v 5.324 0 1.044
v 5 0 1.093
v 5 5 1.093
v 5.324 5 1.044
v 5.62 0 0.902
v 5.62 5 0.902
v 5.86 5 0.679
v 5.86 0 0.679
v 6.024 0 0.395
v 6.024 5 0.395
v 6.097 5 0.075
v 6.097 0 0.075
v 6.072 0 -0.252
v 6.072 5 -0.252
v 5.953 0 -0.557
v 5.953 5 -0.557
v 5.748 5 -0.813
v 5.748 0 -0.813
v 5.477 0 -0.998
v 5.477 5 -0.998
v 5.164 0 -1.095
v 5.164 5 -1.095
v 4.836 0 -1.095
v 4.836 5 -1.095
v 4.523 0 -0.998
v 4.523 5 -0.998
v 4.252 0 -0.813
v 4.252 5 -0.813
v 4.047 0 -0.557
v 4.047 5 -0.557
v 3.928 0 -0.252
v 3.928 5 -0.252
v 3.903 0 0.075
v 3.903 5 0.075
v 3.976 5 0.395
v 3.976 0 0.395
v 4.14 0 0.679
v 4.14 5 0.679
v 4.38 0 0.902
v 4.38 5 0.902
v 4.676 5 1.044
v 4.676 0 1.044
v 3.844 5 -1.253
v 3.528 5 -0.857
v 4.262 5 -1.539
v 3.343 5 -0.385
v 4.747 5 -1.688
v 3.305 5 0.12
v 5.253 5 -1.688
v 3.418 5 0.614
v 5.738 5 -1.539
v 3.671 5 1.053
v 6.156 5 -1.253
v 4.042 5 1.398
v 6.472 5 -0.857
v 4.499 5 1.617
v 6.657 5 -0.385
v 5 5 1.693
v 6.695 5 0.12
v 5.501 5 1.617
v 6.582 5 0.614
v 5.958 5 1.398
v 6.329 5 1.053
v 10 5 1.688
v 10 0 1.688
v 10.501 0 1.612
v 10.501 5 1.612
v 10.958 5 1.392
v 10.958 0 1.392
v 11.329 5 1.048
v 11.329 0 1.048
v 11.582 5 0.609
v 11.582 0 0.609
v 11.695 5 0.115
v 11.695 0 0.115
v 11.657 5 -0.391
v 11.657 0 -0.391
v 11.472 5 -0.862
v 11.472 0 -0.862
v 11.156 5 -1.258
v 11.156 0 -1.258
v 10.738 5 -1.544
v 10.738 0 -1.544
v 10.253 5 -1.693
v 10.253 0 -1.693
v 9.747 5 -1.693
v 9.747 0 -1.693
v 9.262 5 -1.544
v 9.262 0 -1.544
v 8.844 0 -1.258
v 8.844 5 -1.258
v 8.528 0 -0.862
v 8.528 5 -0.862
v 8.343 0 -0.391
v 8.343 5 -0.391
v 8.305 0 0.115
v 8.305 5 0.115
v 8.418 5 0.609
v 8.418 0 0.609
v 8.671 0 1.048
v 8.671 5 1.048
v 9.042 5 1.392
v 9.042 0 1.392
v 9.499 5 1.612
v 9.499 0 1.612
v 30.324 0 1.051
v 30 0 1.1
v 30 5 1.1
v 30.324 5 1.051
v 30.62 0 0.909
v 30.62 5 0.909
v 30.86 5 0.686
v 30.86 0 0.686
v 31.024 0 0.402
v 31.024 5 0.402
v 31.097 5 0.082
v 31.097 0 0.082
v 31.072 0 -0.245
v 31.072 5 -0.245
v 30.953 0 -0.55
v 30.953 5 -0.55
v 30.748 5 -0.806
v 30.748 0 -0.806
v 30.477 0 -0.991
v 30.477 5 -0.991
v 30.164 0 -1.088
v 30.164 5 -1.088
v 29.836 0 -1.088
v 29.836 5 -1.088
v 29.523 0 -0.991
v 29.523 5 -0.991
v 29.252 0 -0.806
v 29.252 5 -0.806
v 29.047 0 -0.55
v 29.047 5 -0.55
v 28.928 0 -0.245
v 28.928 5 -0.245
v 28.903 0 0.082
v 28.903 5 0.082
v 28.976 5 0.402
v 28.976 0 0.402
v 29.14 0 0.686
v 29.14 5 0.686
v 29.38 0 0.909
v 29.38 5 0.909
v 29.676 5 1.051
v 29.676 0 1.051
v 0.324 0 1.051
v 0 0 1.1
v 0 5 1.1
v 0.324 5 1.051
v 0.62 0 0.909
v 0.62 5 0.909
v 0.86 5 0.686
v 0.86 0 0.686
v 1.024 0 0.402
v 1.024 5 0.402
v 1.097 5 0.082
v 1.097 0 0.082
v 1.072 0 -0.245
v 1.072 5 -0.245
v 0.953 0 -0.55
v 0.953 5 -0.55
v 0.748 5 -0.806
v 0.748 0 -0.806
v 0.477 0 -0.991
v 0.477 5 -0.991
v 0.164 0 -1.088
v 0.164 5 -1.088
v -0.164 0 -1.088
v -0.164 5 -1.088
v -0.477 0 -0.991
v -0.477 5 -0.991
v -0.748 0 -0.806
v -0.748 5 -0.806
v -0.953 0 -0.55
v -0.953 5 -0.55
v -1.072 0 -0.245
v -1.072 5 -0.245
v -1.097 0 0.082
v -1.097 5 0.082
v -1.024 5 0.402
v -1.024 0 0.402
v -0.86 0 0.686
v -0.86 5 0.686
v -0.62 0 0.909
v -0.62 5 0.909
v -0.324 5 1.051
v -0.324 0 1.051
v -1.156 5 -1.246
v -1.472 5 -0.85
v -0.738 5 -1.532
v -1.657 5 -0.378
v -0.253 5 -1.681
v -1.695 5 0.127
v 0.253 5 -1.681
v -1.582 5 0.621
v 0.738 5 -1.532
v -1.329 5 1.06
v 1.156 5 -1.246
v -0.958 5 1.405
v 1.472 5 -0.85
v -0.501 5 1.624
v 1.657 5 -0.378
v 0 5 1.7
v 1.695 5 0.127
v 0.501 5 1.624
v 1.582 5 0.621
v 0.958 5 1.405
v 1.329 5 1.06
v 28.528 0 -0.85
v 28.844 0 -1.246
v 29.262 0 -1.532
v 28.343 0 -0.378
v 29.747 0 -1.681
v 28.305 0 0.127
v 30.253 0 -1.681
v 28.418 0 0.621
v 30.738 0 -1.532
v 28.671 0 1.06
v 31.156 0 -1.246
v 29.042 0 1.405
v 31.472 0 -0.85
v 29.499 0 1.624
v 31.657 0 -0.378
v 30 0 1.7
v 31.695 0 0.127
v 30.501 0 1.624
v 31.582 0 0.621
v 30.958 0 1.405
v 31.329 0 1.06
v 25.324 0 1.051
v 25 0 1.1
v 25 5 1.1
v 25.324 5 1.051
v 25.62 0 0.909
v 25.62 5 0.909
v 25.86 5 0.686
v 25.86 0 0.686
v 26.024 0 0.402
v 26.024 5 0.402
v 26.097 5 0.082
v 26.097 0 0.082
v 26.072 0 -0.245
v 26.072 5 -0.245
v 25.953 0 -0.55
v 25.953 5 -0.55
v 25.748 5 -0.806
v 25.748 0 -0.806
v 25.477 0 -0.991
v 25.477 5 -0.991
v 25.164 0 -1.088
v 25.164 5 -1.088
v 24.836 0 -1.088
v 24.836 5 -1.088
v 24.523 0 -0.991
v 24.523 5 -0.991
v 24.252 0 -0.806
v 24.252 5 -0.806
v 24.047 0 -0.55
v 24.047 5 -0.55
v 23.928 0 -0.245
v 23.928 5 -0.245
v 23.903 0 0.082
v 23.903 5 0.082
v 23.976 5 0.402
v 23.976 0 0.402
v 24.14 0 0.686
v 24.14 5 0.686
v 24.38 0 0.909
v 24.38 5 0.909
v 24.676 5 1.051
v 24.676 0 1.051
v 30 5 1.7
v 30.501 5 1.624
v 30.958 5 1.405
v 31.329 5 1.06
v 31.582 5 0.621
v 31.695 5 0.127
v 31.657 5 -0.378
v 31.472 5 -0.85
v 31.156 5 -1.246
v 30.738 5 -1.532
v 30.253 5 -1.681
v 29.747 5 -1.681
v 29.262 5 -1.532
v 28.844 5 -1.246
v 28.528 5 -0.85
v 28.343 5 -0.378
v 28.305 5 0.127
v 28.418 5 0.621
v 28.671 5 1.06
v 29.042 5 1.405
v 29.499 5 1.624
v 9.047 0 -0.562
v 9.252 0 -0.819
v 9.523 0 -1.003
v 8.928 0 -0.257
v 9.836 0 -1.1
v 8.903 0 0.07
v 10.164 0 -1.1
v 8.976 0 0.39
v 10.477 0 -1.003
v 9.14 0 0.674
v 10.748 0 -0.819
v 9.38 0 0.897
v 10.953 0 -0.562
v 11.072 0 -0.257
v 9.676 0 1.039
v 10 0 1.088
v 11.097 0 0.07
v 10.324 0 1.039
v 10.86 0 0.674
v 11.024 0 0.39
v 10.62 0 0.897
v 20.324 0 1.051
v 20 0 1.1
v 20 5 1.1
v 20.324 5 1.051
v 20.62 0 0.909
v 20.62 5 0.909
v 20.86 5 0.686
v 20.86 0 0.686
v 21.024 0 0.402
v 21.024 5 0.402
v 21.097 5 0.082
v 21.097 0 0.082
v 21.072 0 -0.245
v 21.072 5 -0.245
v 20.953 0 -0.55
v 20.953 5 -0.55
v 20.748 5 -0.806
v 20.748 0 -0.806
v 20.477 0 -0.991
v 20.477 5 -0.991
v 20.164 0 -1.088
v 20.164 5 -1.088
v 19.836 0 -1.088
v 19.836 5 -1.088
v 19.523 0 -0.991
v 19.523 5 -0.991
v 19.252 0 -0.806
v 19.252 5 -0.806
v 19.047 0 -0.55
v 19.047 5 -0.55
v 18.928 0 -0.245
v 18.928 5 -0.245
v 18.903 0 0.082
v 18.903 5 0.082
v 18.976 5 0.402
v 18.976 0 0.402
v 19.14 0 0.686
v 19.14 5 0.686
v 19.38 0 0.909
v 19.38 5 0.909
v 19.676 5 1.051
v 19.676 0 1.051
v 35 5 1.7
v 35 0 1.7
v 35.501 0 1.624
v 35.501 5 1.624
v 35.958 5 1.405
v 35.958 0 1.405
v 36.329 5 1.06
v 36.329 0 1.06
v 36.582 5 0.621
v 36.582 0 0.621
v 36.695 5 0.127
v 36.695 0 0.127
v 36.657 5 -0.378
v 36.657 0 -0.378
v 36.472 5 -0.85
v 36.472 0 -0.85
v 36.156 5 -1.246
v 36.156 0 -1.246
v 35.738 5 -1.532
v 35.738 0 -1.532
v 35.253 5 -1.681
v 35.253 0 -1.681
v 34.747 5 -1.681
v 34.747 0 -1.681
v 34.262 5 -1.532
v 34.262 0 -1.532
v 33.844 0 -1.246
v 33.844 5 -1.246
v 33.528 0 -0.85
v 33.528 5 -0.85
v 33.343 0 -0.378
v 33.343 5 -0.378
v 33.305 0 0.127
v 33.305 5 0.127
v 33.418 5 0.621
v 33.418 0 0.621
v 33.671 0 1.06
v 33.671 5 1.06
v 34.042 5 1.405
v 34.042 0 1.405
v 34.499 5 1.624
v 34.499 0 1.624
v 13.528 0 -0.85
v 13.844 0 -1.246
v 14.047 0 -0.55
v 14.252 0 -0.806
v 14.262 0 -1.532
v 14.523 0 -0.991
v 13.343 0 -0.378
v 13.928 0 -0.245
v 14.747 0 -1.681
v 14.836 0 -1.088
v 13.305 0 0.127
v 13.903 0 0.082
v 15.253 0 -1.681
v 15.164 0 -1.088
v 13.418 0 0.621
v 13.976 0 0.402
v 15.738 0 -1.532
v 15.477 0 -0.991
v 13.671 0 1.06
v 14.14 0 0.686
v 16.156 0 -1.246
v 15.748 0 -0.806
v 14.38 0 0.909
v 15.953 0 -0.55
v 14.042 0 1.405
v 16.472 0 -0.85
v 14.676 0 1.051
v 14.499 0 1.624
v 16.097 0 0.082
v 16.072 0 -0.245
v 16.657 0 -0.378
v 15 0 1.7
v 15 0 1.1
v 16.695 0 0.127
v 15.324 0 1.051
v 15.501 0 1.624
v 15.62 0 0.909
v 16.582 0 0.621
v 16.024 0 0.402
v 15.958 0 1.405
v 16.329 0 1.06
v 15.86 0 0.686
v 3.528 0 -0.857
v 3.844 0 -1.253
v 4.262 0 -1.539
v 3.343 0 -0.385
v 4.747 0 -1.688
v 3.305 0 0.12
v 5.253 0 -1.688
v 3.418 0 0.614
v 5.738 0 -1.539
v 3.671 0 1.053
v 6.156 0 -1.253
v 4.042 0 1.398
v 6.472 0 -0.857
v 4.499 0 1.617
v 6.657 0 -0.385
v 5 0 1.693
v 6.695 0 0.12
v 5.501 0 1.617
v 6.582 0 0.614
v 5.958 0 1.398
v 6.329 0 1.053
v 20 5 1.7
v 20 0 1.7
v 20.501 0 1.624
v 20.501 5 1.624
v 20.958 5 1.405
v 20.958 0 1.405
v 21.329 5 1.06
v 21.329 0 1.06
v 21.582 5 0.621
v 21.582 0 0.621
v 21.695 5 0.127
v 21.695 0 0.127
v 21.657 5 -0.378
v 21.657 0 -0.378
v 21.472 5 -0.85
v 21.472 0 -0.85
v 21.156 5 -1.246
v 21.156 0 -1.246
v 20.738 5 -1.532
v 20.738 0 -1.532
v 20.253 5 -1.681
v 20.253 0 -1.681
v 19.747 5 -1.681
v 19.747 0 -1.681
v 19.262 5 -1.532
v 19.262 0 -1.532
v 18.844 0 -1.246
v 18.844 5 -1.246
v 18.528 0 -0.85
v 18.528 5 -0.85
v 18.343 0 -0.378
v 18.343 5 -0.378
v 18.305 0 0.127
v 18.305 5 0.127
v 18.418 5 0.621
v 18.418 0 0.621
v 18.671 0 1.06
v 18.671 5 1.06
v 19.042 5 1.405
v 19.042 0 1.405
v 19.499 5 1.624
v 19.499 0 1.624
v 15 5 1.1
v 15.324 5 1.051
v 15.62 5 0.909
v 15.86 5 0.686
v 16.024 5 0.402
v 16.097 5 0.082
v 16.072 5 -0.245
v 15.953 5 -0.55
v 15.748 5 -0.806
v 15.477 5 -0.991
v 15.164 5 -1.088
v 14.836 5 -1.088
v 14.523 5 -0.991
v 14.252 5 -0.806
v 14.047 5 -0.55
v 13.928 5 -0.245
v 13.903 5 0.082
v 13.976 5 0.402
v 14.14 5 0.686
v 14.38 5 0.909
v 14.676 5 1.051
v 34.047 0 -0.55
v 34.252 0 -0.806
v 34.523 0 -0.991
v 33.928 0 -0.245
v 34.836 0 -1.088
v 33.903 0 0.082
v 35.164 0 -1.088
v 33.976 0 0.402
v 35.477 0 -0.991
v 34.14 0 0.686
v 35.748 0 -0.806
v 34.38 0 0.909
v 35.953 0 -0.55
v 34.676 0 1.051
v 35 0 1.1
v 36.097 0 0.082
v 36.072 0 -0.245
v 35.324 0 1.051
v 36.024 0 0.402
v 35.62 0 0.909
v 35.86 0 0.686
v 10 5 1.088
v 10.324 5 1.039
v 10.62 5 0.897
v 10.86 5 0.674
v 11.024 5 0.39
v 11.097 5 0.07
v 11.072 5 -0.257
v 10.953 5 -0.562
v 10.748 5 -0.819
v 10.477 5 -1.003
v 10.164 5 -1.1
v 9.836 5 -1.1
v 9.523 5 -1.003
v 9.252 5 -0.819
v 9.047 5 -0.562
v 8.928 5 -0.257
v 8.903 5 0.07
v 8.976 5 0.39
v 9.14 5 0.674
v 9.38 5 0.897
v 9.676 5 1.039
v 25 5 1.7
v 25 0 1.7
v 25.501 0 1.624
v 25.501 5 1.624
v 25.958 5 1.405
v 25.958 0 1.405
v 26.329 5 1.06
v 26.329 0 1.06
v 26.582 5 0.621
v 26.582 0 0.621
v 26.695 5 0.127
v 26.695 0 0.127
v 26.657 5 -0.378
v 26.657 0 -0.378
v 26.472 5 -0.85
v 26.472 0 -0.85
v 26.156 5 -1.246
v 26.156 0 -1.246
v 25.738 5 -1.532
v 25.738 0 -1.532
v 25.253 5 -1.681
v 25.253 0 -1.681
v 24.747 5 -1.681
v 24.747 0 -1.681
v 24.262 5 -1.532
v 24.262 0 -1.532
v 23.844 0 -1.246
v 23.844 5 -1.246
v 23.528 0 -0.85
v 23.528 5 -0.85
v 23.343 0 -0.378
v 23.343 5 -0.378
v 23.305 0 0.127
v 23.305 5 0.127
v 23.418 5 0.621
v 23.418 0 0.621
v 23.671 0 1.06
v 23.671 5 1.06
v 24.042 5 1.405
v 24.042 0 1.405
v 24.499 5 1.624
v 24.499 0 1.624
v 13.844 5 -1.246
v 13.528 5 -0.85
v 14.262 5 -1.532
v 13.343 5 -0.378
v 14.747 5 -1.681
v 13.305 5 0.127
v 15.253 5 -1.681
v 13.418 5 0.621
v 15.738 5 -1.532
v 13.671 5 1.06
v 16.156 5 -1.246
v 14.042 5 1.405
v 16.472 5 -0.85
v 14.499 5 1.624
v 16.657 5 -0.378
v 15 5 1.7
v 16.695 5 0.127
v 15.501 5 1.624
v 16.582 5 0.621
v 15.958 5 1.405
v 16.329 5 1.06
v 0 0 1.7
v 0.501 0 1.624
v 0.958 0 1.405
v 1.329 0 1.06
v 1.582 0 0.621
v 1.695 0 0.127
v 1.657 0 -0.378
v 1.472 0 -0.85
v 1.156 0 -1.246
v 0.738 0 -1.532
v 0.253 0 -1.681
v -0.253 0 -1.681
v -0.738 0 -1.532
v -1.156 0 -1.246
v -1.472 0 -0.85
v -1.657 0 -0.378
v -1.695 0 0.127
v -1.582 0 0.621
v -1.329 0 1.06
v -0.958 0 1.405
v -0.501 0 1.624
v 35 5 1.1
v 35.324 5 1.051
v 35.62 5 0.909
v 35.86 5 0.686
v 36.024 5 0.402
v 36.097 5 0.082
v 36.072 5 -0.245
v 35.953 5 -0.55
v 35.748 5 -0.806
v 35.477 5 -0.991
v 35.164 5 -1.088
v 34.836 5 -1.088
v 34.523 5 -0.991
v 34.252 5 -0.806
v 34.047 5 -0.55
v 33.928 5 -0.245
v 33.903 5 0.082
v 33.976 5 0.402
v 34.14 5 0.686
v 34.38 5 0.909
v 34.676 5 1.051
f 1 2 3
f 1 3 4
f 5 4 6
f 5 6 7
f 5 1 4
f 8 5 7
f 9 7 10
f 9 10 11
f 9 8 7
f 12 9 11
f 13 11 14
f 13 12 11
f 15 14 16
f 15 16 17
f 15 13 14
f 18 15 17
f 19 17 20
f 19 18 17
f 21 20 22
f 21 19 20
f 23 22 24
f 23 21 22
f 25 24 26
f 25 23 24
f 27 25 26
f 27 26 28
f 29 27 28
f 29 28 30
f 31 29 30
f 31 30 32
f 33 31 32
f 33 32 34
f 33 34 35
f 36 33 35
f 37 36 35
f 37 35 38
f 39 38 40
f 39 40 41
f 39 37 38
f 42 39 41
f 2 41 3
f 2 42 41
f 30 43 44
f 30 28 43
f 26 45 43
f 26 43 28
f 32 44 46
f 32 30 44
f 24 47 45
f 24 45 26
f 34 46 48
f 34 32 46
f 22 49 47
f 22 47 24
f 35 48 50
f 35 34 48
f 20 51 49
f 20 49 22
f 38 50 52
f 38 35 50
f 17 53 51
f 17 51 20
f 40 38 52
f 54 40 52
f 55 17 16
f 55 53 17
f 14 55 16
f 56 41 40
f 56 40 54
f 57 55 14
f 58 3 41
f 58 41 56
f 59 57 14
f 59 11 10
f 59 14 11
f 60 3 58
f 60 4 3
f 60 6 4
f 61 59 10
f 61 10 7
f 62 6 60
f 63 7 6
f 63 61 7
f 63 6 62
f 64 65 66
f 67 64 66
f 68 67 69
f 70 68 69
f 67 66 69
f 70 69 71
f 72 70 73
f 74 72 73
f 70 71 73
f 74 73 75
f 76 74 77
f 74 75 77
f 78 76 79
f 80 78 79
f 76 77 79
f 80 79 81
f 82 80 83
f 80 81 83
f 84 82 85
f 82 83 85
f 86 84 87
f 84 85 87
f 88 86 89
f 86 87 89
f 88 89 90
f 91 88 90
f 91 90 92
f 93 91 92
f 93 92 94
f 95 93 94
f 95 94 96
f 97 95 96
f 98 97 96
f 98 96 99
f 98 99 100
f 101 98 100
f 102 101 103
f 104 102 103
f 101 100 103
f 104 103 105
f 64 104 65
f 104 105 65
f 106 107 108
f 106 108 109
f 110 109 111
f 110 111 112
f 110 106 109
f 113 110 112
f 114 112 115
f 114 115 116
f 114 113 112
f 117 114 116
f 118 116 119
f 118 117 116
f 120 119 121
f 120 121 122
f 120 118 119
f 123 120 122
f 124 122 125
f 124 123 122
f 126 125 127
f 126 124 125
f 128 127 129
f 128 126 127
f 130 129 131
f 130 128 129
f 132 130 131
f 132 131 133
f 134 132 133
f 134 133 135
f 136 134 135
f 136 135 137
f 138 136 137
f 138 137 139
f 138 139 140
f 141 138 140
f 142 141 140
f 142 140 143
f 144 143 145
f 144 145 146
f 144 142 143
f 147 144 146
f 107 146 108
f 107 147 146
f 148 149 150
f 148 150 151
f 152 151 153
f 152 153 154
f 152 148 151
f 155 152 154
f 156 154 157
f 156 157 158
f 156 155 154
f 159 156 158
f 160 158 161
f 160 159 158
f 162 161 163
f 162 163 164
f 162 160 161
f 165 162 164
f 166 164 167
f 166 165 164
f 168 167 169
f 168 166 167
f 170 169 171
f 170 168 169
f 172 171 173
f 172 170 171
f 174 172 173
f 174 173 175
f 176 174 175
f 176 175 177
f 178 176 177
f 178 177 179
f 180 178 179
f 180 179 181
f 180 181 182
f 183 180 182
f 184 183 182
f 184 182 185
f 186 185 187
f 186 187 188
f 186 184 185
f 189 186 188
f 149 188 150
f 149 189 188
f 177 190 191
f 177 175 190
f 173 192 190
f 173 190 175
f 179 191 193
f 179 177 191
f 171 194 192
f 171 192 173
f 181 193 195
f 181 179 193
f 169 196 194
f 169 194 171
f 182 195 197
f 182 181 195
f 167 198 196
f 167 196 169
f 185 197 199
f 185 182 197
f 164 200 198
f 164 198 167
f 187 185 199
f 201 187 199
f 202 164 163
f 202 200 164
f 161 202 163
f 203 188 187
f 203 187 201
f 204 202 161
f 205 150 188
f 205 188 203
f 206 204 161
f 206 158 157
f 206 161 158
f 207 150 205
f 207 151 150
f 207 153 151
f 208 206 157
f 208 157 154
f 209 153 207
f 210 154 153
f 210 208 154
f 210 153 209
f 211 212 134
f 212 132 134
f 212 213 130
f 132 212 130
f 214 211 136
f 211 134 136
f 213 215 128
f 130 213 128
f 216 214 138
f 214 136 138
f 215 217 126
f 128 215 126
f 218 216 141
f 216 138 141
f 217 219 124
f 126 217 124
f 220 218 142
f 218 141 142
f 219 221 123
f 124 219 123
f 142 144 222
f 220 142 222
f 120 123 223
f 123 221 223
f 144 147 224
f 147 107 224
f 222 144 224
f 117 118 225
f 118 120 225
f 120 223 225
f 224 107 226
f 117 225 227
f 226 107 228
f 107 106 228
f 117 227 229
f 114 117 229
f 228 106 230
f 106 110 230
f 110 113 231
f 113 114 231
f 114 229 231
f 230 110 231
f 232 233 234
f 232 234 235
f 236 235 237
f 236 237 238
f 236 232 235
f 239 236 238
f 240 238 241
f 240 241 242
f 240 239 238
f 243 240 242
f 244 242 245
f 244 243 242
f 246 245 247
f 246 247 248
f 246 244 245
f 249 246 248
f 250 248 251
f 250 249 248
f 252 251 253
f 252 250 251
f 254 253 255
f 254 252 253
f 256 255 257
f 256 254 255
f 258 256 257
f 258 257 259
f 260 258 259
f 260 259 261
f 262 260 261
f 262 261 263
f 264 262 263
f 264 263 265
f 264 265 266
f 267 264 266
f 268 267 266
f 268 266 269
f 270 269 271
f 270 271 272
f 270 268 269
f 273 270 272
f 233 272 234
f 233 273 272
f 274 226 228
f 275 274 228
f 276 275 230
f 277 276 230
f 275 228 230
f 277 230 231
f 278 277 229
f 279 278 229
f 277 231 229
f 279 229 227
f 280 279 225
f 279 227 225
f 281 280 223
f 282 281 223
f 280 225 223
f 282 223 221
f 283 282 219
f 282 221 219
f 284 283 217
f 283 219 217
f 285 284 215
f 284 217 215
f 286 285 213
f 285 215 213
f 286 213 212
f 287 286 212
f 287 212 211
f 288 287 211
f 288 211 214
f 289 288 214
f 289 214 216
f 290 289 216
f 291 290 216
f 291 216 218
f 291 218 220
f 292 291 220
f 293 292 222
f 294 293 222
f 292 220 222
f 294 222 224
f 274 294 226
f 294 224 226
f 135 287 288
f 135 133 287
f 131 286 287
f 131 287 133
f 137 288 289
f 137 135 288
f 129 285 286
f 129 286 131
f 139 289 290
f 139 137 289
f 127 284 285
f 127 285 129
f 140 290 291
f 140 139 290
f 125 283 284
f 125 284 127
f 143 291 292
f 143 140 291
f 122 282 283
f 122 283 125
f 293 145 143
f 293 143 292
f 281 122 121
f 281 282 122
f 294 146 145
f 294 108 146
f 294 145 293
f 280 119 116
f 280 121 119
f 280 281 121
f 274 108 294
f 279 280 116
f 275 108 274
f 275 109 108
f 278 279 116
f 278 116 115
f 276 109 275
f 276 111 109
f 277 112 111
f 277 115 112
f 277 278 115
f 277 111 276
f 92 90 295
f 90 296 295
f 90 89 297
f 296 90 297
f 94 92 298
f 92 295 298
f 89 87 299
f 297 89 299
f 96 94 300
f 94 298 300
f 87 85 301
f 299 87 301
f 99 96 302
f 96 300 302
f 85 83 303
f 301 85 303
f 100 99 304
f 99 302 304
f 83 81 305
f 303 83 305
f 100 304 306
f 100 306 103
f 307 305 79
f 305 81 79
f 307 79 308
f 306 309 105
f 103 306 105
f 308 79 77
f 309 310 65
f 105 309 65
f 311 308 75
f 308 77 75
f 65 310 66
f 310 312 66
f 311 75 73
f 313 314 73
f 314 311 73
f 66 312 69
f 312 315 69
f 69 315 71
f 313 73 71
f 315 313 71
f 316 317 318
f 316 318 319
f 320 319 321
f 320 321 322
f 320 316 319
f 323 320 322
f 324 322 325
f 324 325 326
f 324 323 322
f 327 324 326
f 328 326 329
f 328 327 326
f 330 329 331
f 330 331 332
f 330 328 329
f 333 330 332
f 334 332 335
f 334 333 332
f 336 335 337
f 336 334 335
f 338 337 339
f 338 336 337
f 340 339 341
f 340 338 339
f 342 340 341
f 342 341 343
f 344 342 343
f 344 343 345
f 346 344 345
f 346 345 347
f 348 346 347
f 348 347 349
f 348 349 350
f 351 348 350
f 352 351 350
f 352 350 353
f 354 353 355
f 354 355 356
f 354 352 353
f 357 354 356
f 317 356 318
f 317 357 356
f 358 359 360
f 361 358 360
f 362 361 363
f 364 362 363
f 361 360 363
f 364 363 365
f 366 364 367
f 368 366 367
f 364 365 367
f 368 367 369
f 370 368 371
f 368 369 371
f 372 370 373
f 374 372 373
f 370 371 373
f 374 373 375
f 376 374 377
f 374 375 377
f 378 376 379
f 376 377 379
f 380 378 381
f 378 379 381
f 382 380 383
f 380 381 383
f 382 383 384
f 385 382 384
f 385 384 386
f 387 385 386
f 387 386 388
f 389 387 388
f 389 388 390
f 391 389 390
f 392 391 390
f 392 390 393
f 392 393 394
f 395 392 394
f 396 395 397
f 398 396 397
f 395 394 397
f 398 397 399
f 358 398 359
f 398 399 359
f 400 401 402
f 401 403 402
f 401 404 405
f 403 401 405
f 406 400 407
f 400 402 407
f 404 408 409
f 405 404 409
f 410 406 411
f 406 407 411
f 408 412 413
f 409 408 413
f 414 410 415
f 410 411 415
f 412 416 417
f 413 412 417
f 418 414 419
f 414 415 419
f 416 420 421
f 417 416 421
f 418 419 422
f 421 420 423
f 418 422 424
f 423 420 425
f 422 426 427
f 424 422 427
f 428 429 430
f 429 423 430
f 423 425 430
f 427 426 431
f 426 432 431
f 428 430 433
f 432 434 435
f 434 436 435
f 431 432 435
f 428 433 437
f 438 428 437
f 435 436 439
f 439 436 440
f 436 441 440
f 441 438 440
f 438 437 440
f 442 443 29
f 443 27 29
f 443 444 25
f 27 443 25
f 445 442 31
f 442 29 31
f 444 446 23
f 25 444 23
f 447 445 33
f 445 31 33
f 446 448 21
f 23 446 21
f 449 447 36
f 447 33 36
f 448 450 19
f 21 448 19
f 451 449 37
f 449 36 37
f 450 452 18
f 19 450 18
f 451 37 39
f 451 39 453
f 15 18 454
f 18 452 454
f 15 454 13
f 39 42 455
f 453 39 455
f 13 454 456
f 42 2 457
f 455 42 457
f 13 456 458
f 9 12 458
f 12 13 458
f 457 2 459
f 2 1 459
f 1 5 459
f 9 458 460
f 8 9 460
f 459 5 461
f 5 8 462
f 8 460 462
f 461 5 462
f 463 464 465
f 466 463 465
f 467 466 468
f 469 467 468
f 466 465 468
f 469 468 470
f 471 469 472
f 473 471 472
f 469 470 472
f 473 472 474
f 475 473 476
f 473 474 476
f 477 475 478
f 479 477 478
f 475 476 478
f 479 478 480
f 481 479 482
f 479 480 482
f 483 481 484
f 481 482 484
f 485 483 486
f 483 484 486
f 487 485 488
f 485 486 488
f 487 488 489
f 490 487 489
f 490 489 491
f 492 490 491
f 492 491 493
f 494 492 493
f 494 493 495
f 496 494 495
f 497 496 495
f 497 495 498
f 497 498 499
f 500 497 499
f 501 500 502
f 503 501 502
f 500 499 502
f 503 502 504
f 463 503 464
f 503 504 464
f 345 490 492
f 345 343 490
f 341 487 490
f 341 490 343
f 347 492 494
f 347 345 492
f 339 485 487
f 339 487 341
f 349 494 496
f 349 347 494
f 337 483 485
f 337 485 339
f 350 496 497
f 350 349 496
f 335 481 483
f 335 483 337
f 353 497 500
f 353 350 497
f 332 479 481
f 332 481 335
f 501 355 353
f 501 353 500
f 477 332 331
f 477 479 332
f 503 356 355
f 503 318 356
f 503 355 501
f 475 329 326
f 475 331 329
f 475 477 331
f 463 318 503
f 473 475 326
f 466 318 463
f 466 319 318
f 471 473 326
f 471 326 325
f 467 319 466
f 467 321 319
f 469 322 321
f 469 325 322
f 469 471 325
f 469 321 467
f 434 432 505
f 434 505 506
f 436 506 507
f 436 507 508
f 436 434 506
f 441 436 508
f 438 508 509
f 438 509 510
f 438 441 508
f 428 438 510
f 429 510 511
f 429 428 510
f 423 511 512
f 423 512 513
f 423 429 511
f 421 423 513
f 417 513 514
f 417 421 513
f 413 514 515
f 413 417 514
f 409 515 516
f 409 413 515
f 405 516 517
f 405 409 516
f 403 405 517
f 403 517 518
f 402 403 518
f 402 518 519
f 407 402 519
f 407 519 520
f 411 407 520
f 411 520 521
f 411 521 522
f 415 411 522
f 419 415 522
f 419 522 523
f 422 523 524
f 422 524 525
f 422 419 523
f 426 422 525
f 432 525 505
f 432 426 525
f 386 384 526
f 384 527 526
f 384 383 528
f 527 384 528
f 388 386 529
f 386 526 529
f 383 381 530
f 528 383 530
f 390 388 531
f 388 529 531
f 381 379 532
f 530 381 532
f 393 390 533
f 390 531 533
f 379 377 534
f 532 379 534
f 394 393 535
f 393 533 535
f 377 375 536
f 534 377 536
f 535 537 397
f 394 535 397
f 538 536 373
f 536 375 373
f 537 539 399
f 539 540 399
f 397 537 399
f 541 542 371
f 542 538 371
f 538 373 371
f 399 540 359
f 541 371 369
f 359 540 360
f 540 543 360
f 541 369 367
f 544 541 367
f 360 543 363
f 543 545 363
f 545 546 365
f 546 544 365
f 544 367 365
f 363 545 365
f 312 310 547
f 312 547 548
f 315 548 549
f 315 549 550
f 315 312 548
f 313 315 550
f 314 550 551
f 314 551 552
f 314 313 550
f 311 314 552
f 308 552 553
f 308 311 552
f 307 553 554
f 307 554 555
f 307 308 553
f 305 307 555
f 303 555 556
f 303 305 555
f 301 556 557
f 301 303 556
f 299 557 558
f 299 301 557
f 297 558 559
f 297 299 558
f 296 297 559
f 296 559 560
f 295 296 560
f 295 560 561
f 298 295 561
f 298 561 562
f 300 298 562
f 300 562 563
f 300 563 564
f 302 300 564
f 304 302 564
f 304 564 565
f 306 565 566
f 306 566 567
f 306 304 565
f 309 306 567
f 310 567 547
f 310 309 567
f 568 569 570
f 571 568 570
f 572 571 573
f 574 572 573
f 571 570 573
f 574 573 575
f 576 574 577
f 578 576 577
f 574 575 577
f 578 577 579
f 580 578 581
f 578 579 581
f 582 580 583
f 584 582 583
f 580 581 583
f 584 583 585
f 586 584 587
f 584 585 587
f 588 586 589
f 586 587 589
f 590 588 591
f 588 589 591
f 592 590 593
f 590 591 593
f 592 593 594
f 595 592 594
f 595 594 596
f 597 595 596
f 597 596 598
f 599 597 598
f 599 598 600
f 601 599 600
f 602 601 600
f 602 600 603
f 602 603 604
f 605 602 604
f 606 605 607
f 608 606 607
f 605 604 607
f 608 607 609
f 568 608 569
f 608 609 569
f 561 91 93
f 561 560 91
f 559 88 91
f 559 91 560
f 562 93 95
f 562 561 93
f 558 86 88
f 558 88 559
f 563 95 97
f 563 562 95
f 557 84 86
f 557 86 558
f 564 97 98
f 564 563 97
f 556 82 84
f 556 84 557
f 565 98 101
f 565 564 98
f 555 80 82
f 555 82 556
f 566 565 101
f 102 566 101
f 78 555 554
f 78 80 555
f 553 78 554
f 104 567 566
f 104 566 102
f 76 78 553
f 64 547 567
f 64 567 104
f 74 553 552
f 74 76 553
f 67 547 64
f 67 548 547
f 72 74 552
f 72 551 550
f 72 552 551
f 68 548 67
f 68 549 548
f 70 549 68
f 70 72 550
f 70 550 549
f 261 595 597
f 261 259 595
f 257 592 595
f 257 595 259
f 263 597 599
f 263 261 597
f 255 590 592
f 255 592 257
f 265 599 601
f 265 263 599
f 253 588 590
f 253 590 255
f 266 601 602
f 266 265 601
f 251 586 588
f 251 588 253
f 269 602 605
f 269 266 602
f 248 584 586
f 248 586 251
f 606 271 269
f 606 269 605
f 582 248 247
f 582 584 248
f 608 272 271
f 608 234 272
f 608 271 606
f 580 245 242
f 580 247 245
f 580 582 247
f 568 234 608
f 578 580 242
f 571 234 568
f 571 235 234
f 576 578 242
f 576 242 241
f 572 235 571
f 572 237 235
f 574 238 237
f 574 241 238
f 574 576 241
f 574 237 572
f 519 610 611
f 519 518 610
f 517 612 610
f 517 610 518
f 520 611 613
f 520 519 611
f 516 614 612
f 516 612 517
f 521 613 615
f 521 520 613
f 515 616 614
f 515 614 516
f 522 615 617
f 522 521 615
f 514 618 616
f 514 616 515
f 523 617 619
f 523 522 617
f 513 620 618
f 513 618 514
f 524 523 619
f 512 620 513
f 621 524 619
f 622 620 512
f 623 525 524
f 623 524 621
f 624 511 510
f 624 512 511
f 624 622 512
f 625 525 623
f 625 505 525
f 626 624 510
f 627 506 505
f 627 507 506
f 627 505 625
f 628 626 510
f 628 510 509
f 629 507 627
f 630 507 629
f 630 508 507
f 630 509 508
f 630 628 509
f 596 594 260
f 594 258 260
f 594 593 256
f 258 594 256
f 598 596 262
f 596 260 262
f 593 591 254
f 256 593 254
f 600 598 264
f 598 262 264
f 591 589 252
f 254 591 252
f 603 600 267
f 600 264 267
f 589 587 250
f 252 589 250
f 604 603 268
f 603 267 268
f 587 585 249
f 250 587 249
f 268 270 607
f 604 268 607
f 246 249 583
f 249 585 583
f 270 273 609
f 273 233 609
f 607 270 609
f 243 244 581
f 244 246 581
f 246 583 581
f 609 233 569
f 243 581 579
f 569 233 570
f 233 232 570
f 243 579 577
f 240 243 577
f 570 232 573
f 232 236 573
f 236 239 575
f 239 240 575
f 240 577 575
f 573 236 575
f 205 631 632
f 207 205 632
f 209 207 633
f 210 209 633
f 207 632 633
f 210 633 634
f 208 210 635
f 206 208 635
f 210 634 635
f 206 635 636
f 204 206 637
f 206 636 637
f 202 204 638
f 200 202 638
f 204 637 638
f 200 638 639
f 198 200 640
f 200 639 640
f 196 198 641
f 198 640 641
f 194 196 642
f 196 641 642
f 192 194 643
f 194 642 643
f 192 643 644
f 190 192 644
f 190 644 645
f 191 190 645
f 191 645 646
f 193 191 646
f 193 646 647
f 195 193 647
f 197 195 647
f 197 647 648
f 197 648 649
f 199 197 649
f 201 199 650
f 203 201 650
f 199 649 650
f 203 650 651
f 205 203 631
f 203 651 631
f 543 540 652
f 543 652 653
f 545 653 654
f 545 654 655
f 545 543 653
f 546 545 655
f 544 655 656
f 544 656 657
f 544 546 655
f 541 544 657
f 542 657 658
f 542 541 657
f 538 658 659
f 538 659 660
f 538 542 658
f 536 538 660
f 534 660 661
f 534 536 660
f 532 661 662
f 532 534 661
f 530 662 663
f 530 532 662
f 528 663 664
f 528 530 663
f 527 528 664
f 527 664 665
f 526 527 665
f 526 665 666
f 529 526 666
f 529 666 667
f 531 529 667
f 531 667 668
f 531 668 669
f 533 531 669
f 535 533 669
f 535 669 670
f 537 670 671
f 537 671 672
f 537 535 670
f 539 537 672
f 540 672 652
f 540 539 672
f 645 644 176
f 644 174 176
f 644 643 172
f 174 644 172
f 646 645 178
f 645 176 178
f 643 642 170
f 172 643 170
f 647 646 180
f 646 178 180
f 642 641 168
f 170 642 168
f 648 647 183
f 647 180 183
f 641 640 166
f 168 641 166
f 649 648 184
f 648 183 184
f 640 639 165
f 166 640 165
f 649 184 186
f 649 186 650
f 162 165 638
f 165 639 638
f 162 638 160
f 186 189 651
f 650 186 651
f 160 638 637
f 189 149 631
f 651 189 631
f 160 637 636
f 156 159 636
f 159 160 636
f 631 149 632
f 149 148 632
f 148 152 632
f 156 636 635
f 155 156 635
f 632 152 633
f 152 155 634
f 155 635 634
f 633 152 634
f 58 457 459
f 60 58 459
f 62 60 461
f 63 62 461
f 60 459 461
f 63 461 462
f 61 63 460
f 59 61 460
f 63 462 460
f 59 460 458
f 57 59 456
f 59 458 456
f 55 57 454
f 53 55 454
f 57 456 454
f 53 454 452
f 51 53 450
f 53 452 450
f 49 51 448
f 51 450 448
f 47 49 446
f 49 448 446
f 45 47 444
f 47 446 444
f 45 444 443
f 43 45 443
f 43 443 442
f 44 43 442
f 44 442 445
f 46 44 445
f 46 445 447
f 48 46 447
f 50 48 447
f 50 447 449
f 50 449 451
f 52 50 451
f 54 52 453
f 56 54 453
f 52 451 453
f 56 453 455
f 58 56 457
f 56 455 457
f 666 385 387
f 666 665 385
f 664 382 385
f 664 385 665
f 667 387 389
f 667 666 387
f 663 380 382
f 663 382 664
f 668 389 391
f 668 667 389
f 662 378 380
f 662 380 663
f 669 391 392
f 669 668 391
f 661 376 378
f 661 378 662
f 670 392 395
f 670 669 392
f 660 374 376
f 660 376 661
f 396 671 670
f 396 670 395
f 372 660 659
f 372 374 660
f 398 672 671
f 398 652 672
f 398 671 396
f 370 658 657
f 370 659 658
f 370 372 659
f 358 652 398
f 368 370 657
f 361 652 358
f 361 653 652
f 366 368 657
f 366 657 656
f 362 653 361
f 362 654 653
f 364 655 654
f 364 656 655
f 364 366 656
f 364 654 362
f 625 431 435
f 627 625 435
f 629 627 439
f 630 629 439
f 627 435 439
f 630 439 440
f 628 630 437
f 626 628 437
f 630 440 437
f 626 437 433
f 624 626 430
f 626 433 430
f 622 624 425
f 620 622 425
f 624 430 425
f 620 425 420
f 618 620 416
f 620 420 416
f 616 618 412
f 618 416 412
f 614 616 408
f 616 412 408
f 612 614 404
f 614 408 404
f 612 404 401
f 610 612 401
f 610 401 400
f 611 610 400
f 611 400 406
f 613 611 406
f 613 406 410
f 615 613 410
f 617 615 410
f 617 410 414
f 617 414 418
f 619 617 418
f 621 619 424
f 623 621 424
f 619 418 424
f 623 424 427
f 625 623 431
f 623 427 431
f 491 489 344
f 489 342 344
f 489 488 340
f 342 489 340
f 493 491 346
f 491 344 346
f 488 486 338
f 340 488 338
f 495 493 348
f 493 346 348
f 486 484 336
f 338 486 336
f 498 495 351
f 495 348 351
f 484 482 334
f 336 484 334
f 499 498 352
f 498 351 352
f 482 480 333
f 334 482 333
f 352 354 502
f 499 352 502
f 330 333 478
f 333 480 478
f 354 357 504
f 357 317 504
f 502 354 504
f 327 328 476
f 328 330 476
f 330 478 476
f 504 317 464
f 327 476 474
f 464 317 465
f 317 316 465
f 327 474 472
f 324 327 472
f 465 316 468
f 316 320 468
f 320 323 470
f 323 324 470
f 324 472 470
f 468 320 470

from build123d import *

# Parameters (mm, degrees)
SKETCH1_R             = 1.7
SKETCH1_R_2           = 1.1
BOSS_EXTRUDE1_DEPTH   = 5
BOSS_EXTRUDE1_2_DEPTH = 5
BOSS_EXTRUDE1_3_DEPTH = 5
BOSS_EXTRUDE1_4_DEPTH = 5
BOSS_EXTRUDE1_5_DEPTH = 5
BOSS_EXTRUDE1_6_DEPTH = 5
BOSS_EXTRUDE1_7_DEPTH = 5
BOSS_EXTRUDE1_8_DEPTH = 5


with BuildPart() as part:
    # Sketch1 → Boss-Extrude1 (new body)
    with BuildSketch(Plane(origin=(0, 0, 0), x_dir=(1, 0, 0), z_dir=(0, 1, 0))):
        with Locations(Location((0, 0, 0), (0, 0, 270))):
            Circle(SKETCH1_R)
        with Locations(Location((0, 0, 0), (0, 0, 270))):
            Circle(SKETCH1_R_2, mode=Mode.SUBTRACT)
    extrude(amount=BOSS_EXTRUDE1_DEPTH)


with BuildPart() as body_2:
    # Sketch1 → Boss-Extrude1 2 (new body)
    with BuildSketch(Plane(origin=(0, 0, 0), x_dir=(1, 0, 0), z_dir=(0, 1, 0))):
        with Locations(Location((5, 0.007080747, 0), (0, 0, 270))):
            Circle(SKETCH1_R)
        with Locations(Location((5, 0.007080747, 0), (0, 0, 270))):
            Circle(SKETCH1_R_2, mode=Mode.SUBTRACT)
    extrude(amount=BOSS_EXTRUDE1_2_DEPTH)


with BuildPart() as body_3:
    # Sketch1 → Boss-Extrude1 3 (new body)
    with BuildSketch(Plane(origin=(0, 0, 0), x_dir=(1, 0, 0), z_dir=(0, 1, 0))):
        with Locations(Location((10, 0.012235531, 0), (0, 0, 270))):
            Circle(SKETCH1_R)
        with Locations(Location((10, 0.012235531, 0), (0, 0, 270))):
            Circle(SKETCH1_R_2, mode=Mode.SUBTRACT)
    extrude(amount=BOSS_EXTRUDE1_3_DEPTH)


with BuildPart() as body_4:
    # Sketch1 → Boss-Extrude1 4 (new body)
    with BuildSketch(Plane(origin=(0, 0, 0), x_dir=(1, 0, 0), z_dir=(0, 1, 0))):
        with Locations(Location((15, 0, 0), (0, 0, 270))):
            Circle(SKETCH1_R)
        with Locations(Location((15, 0, 0), (0, 0, 270))):
            Circle(SKETCH1_R_2, mode=Mode.SUBTRACT)
    extrude(amount=BOSS_EXTRUDE1_4_DEPTH)


with BuildPart() as body_5:
    # Sketch1 → Boss-Extrude1 5 (new body)
    with BuildSketch(Plane(origin=(0, 0, 0), x_dir=(1, 0, 0), z_dir=(0, 1, 0))):
        with Locations(Location((20, 0, 0), (0, 0, 270))):
            Circle(SKETCH1_R)
        with Locations(Location((20, 0, 0), (0, 0, 270))):
            Circle(SKETCH1_R_2, mode=Mode.SUBTRACT)
    extrude(amount=BOSS_EXTRUDE1_5_DEPTH)


with BuildPart() as body_6:
    # Sketch1 → Boss-Extrude1 6 (new body)
    with BuildSketch(Plane(origin=(0, 0, 0), x_dir=(1, 0, 0), z_dir=(0, 1, 0))):
        with Locations(Location((25, 0, 0), (0, 0, 270))):
            Circle(SKETCH1_R)
        with Locations(Location((25, 0, 0), (0, 0, 270))):
            Circle(SKETCH1_R_2, mode=Mode.SUBTRACT)
    extrude(amount=BOSS_EXTRUDE1_6_DEPTH)


with BuildPart() as body_7:
    # Sketch1 → Boss-Extrude1 7 (new body)
    with BuildSketch(Plane(origin=(0, 0, 0), x_dir=(1, 0, 0), z_dir=(0, 1, 0))):
        with Locations(Location((30, 0, 0), (0, 0, 270))):
            Circle(SKETCH1_R)
        with Locations(Location((30, 0, 0), (0, 0, 270))):
            Circle(SKETCH1_R_2, mode=Mode.SUBTRACT)
    extrude(amount=BOSS_EXTRUDE1_7_DEPTH)


with BuildPart() as body_8:
    # Sketch1 → Boss-Extrude1 8 (new body)
    with BuildSketch(Plane(origin=(0, 0, 0), x_dir=(1, 0, 0), z_dir=(0, 1, 0))):
        with Locations(Location((35, 0, 0), (0, 0, 270))):
            Circle(SKETCH1_R)
        with Locations(Location((35, 0, 0), (0, 0, 270))):
            Circle(SKETCH1_R_2, mode=Mode.SUBTRACT)
    extrude(amount=BOSS_EXTRUDE1_8_DEPTH)


solid = Compound([part.part, body_2.part, body_3.part, body_4.part, body_5.part, body_6.part, body_7.part, body_8.part])
